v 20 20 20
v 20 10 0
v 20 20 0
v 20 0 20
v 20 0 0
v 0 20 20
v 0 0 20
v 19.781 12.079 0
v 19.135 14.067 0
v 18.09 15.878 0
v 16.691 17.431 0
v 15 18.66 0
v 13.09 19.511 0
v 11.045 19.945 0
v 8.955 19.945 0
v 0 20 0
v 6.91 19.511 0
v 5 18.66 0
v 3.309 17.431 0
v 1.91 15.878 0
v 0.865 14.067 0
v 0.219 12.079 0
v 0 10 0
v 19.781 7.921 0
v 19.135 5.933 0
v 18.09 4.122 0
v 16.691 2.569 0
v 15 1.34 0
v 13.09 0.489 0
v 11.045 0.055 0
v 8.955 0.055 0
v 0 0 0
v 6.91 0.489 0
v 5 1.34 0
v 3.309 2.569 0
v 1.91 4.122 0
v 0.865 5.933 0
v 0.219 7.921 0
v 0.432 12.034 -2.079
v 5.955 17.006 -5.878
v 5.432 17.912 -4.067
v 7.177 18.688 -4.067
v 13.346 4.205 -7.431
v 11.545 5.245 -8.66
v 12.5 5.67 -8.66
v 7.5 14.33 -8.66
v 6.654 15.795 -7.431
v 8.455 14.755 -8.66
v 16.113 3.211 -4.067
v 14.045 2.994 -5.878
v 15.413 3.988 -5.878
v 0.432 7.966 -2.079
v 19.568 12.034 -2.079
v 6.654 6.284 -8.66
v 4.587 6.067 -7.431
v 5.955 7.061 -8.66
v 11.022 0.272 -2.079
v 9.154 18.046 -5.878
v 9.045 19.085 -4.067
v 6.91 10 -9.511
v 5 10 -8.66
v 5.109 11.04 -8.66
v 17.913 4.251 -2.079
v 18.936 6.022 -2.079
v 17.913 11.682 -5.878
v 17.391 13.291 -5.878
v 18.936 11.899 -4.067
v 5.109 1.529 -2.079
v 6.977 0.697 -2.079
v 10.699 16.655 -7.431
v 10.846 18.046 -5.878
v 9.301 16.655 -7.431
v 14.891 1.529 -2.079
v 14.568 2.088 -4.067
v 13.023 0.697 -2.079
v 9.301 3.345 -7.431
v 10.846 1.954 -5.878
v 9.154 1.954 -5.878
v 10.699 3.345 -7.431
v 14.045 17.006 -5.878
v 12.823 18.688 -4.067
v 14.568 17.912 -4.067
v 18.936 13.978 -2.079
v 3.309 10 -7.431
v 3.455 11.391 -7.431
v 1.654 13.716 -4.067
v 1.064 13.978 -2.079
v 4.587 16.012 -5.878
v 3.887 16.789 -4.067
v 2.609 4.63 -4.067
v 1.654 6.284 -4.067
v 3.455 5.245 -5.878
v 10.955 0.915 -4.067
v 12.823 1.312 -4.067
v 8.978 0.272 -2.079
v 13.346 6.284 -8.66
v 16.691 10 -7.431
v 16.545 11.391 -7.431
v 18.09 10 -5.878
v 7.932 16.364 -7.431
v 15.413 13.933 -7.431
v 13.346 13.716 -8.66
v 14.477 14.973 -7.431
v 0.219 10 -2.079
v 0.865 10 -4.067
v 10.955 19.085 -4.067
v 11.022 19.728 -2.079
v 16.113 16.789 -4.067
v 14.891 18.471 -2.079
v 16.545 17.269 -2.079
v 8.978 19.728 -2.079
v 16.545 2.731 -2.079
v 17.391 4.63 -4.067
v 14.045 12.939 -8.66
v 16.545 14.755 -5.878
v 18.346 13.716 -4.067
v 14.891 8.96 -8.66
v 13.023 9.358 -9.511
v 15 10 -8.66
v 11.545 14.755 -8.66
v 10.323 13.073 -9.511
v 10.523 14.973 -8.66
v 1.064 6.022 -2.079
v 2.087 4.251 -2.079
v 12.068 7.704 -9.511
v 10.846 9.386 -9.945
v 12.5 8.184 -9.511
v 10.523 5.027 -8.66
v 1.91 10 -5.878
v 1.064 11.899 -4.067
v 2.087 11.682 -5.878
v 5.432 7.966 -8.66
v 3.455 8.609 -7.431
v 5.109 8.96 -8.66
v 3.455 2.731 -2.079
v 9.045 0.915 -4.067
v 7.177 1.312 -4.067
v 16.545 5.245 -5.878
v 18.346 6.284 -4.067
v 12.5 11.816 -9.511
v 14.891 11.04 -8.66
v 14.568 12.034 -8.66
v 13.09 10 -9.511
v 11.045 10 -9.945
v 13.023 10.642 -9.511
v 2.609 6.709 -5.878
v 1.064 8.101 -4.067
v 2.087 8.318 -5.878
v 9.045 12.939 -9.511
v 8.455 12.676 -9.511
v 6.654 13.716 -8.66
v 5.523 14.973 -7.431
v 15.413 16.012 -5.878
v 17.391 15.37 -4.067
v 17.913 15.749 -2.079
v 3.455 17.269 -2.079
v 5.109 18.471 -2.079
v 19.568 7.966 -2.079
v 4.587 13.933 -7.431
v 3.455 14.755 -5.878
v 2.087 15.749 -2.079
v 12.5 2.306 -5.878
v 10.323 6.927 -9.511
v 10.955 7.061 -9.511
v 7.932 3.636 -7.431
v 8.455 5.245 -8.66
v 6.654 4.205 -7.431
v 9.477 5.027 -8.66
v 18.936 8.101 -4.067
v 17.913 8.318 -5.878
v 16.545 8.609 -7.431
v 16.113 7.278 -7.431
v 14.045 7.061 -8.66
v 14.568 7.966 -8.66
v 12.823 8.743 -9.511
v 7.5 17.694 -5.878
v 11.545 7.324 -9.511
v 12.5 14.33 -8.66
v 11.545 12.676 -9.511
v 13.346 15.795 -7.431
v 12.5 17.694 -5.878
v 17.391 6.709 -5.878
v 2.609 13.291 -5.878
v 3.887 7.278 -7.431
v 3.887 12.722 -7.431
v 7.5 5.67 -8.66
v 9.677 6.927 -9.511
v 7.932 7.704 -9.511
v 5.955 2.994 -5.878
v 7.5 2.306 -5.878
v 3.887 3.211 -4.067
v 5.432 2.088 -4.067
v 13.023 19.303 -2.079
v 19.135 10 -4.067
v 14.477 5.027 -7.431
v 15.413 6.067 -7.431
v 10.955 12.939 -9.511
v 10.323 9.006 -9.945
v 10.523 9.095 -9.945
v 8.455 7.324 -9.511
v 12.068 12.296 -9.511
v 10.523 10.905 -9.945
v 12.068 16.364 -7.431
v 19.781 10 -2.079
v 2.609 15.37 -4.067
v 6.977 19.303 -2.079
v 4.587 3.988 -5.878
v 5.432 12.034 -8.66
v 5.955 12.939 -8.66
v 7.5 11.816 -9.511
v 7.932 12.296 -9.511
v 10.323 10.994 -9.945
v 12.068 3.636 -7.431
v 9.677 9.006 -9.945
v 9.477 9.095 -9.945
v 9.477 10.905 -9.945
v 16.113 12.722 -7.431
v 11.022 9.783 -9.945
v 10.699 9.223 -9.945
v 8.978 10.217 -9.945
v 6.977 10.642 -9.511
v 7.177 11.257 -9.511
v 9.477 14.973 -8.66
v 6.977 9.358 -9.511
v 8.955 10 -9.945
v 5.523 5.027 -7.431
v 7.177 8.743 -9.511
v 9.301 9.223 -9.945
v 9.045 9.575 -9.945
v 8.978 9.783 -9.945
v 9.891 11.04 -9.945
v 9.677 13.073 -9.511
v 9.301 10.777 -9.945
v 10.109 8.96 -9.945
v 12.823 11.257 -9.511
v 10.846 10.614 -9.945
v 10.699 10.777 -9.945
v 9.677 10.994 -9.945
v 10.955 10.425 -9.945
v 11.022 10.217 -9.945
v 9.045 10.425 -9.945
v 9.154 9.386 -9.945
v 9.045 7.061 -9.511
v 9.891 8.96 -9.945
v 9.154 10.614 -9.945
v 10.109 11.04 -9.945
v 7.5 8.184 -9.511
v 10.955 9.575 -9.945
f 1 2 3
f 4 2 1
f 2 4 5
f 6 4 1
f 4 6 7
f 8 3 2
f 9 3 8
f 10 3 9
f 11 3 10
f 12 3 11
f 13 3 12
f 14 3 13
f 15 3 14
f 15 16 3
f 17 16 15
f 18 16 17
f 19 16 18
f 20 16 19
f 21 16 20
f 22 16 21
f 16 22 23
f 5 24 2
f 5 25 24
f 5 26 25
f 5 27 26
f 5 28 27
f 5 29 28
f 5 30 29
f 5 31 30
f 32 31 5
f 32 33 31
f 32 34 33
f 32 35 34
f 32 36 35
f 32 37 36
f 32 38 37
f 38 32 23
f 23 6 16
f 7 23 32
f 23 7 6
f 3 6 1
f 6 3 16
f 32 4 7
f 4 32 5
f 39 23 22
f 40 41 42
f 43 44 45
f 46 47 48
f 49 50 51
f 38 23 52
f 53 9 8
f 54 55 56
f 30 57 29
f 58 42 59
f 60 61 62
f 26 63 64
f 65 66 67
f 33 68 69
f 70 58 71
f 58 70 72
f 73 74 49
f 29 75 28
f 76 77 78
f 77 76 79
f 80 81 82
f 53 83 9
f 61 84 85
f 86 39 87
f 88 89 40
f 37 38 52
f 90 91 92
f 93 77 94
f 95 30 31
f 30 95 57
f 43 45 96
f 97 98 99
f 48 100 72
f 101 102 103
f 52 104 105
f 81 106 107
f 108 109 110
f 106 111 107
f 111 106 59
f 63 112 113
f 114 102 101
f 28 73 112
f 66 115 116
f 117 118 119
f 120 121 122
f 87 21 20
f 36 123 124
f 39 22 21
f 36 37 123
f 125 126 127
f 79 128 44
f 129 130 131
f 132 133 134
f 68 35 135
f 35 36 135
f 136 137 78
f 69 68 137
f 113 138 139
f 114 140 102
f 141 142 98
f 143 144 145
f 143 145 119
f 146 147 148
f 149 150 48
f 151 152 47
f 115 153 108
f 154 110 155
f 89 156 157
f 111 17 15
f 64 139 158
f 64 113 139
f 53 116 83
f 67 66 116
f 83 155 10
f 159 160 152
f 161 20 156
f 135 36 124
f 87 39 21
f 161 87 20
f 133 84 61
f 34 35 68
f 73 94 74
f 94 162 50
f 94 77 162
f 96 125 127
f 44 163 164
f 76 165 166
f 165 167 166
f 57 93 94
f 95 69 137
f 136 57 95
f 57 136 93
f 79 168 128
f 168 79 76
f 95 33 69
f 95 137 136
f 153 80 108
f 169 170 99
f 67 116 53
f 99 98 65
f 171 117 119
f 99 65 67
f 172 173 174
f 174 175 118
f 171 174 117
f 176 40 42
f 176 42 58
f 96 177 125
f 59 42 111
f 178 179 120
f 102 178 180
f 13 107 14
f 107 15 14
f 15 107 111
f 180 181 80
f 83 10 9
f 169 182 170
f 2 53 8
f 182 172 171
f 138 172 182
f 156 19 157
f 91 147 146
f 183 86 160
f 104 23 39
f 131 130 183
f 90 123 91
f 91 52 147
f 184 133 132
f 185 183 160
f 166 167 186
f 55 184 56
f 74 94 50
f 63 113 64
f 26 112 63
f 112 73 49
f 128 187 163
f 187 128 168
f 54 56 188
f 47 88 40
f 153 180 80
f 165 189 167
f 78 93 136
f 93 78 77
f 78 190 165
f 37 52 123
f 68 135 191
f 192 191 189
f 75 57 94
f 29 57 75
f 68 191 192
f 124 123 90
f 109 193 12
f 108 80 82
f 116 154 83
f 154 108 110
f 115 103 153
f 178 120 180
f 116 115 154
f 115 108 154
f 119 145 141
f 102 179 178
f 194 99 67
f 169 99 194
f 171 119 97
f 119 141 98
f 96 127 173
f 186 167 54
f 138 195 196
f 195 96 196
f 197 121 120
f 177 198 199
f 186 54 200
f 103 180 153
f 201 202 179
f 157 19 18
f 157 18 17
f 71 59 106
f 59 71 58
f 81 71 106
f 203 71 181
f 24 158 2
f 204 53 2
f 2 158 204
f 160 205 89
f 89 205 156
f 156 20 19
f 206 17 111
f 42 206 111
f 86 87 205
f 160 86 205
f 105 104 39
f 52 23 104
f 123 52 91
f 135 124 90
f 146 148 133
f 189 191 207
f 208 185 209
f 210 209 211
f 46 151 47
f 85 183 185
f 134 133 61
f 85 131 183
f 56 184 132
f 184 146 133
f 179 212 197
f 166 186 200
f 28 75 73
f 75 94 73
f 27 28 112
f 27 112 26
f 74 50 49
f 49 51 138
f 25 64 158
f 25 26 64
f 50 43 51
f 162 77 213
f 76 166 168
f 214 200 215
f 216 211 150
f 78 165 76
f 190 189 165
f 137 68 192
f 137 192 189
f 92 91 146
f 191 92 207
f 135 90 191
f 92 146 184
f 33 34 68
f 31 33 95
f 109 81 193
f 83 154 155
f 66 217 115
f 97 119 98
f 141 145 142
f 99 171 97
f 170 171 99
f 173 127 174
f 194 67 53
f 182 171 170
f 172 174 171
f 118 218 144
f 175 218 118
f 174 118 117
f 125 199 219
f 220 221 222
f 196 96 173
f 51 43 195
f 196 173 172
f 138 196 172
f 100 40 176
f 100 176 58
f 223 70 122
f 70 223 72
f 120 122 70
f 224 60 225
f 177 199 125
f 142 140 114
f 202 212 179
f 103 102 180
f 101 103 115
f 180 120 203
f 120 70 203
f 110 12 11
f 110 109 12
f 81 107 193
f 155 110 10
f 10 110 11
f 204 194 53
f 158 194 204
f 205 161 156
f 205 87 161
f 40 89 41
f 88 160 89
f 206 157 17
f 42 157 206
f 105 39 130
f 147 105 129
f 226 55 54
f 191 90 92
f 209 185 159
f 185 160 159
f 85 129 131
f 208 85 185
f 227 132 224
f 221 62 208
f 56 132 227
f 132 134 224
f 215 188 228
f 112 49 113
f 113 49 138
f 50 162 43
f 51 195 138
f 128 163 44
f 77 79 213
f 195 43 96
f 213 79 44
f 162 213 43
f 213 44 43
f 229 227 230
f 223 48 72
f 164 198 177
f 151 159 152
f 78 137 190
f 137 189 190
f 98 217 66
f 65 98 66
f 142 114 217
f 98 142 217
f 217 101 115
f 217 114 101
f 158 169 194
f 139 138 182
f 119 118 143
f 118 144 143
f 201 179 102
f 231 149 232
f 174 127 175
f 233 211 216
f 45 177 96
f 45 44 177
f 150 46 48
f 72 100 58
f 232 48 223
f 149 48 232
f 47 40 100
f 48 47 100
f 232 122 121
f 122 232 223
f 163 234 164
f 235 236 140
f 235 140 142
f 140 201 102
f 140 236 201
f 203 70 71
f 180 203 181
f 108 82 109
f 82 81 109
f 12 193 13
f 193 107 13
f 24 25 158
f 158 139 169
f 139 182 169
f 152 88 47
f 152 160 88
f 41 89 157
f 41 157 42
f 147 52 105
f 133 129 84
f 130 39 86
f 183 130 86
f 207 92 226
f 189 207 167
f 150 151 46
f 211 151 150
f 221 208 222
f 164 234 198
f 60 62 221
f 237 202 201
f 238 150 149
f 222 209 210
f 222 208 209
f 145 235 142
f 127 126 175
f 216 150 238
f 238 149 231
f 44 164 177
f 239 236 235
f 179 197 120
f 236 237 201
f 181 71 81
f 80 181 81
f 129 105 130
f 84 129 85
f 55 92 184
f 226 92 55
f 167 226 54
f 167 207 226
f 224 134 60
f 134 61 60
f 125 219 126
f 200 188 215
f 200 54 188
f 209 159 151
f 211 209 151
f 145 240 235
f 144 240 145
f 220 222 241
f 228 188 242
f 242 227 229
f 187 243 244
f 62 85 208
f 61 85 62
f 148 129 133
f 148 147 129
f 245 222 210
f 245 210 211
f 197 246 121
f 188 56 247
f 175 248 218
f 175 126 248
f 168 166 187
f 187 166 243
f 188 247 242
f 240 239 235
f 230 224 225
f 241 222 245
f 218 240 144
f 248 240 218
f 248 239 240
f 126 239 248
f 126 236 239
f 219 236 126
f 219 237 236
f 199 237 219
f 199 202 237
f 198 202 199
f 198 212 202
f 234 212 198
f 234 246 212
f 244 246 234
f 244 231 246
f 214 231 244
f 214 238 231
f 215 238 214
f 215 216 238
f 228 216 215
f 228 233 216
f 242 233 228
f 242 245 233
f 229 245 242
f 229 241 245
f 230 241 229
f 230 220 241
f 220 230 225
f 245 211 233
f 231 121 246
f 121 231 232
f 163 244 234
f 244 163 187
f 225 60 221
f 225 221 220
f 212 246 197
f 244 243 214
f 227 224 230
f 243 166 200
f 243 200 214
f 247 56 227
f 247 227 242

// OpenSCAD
union() {
    cube([20, 20, 20]);
    translate([10, 10, 0]) sphere(10);
}
